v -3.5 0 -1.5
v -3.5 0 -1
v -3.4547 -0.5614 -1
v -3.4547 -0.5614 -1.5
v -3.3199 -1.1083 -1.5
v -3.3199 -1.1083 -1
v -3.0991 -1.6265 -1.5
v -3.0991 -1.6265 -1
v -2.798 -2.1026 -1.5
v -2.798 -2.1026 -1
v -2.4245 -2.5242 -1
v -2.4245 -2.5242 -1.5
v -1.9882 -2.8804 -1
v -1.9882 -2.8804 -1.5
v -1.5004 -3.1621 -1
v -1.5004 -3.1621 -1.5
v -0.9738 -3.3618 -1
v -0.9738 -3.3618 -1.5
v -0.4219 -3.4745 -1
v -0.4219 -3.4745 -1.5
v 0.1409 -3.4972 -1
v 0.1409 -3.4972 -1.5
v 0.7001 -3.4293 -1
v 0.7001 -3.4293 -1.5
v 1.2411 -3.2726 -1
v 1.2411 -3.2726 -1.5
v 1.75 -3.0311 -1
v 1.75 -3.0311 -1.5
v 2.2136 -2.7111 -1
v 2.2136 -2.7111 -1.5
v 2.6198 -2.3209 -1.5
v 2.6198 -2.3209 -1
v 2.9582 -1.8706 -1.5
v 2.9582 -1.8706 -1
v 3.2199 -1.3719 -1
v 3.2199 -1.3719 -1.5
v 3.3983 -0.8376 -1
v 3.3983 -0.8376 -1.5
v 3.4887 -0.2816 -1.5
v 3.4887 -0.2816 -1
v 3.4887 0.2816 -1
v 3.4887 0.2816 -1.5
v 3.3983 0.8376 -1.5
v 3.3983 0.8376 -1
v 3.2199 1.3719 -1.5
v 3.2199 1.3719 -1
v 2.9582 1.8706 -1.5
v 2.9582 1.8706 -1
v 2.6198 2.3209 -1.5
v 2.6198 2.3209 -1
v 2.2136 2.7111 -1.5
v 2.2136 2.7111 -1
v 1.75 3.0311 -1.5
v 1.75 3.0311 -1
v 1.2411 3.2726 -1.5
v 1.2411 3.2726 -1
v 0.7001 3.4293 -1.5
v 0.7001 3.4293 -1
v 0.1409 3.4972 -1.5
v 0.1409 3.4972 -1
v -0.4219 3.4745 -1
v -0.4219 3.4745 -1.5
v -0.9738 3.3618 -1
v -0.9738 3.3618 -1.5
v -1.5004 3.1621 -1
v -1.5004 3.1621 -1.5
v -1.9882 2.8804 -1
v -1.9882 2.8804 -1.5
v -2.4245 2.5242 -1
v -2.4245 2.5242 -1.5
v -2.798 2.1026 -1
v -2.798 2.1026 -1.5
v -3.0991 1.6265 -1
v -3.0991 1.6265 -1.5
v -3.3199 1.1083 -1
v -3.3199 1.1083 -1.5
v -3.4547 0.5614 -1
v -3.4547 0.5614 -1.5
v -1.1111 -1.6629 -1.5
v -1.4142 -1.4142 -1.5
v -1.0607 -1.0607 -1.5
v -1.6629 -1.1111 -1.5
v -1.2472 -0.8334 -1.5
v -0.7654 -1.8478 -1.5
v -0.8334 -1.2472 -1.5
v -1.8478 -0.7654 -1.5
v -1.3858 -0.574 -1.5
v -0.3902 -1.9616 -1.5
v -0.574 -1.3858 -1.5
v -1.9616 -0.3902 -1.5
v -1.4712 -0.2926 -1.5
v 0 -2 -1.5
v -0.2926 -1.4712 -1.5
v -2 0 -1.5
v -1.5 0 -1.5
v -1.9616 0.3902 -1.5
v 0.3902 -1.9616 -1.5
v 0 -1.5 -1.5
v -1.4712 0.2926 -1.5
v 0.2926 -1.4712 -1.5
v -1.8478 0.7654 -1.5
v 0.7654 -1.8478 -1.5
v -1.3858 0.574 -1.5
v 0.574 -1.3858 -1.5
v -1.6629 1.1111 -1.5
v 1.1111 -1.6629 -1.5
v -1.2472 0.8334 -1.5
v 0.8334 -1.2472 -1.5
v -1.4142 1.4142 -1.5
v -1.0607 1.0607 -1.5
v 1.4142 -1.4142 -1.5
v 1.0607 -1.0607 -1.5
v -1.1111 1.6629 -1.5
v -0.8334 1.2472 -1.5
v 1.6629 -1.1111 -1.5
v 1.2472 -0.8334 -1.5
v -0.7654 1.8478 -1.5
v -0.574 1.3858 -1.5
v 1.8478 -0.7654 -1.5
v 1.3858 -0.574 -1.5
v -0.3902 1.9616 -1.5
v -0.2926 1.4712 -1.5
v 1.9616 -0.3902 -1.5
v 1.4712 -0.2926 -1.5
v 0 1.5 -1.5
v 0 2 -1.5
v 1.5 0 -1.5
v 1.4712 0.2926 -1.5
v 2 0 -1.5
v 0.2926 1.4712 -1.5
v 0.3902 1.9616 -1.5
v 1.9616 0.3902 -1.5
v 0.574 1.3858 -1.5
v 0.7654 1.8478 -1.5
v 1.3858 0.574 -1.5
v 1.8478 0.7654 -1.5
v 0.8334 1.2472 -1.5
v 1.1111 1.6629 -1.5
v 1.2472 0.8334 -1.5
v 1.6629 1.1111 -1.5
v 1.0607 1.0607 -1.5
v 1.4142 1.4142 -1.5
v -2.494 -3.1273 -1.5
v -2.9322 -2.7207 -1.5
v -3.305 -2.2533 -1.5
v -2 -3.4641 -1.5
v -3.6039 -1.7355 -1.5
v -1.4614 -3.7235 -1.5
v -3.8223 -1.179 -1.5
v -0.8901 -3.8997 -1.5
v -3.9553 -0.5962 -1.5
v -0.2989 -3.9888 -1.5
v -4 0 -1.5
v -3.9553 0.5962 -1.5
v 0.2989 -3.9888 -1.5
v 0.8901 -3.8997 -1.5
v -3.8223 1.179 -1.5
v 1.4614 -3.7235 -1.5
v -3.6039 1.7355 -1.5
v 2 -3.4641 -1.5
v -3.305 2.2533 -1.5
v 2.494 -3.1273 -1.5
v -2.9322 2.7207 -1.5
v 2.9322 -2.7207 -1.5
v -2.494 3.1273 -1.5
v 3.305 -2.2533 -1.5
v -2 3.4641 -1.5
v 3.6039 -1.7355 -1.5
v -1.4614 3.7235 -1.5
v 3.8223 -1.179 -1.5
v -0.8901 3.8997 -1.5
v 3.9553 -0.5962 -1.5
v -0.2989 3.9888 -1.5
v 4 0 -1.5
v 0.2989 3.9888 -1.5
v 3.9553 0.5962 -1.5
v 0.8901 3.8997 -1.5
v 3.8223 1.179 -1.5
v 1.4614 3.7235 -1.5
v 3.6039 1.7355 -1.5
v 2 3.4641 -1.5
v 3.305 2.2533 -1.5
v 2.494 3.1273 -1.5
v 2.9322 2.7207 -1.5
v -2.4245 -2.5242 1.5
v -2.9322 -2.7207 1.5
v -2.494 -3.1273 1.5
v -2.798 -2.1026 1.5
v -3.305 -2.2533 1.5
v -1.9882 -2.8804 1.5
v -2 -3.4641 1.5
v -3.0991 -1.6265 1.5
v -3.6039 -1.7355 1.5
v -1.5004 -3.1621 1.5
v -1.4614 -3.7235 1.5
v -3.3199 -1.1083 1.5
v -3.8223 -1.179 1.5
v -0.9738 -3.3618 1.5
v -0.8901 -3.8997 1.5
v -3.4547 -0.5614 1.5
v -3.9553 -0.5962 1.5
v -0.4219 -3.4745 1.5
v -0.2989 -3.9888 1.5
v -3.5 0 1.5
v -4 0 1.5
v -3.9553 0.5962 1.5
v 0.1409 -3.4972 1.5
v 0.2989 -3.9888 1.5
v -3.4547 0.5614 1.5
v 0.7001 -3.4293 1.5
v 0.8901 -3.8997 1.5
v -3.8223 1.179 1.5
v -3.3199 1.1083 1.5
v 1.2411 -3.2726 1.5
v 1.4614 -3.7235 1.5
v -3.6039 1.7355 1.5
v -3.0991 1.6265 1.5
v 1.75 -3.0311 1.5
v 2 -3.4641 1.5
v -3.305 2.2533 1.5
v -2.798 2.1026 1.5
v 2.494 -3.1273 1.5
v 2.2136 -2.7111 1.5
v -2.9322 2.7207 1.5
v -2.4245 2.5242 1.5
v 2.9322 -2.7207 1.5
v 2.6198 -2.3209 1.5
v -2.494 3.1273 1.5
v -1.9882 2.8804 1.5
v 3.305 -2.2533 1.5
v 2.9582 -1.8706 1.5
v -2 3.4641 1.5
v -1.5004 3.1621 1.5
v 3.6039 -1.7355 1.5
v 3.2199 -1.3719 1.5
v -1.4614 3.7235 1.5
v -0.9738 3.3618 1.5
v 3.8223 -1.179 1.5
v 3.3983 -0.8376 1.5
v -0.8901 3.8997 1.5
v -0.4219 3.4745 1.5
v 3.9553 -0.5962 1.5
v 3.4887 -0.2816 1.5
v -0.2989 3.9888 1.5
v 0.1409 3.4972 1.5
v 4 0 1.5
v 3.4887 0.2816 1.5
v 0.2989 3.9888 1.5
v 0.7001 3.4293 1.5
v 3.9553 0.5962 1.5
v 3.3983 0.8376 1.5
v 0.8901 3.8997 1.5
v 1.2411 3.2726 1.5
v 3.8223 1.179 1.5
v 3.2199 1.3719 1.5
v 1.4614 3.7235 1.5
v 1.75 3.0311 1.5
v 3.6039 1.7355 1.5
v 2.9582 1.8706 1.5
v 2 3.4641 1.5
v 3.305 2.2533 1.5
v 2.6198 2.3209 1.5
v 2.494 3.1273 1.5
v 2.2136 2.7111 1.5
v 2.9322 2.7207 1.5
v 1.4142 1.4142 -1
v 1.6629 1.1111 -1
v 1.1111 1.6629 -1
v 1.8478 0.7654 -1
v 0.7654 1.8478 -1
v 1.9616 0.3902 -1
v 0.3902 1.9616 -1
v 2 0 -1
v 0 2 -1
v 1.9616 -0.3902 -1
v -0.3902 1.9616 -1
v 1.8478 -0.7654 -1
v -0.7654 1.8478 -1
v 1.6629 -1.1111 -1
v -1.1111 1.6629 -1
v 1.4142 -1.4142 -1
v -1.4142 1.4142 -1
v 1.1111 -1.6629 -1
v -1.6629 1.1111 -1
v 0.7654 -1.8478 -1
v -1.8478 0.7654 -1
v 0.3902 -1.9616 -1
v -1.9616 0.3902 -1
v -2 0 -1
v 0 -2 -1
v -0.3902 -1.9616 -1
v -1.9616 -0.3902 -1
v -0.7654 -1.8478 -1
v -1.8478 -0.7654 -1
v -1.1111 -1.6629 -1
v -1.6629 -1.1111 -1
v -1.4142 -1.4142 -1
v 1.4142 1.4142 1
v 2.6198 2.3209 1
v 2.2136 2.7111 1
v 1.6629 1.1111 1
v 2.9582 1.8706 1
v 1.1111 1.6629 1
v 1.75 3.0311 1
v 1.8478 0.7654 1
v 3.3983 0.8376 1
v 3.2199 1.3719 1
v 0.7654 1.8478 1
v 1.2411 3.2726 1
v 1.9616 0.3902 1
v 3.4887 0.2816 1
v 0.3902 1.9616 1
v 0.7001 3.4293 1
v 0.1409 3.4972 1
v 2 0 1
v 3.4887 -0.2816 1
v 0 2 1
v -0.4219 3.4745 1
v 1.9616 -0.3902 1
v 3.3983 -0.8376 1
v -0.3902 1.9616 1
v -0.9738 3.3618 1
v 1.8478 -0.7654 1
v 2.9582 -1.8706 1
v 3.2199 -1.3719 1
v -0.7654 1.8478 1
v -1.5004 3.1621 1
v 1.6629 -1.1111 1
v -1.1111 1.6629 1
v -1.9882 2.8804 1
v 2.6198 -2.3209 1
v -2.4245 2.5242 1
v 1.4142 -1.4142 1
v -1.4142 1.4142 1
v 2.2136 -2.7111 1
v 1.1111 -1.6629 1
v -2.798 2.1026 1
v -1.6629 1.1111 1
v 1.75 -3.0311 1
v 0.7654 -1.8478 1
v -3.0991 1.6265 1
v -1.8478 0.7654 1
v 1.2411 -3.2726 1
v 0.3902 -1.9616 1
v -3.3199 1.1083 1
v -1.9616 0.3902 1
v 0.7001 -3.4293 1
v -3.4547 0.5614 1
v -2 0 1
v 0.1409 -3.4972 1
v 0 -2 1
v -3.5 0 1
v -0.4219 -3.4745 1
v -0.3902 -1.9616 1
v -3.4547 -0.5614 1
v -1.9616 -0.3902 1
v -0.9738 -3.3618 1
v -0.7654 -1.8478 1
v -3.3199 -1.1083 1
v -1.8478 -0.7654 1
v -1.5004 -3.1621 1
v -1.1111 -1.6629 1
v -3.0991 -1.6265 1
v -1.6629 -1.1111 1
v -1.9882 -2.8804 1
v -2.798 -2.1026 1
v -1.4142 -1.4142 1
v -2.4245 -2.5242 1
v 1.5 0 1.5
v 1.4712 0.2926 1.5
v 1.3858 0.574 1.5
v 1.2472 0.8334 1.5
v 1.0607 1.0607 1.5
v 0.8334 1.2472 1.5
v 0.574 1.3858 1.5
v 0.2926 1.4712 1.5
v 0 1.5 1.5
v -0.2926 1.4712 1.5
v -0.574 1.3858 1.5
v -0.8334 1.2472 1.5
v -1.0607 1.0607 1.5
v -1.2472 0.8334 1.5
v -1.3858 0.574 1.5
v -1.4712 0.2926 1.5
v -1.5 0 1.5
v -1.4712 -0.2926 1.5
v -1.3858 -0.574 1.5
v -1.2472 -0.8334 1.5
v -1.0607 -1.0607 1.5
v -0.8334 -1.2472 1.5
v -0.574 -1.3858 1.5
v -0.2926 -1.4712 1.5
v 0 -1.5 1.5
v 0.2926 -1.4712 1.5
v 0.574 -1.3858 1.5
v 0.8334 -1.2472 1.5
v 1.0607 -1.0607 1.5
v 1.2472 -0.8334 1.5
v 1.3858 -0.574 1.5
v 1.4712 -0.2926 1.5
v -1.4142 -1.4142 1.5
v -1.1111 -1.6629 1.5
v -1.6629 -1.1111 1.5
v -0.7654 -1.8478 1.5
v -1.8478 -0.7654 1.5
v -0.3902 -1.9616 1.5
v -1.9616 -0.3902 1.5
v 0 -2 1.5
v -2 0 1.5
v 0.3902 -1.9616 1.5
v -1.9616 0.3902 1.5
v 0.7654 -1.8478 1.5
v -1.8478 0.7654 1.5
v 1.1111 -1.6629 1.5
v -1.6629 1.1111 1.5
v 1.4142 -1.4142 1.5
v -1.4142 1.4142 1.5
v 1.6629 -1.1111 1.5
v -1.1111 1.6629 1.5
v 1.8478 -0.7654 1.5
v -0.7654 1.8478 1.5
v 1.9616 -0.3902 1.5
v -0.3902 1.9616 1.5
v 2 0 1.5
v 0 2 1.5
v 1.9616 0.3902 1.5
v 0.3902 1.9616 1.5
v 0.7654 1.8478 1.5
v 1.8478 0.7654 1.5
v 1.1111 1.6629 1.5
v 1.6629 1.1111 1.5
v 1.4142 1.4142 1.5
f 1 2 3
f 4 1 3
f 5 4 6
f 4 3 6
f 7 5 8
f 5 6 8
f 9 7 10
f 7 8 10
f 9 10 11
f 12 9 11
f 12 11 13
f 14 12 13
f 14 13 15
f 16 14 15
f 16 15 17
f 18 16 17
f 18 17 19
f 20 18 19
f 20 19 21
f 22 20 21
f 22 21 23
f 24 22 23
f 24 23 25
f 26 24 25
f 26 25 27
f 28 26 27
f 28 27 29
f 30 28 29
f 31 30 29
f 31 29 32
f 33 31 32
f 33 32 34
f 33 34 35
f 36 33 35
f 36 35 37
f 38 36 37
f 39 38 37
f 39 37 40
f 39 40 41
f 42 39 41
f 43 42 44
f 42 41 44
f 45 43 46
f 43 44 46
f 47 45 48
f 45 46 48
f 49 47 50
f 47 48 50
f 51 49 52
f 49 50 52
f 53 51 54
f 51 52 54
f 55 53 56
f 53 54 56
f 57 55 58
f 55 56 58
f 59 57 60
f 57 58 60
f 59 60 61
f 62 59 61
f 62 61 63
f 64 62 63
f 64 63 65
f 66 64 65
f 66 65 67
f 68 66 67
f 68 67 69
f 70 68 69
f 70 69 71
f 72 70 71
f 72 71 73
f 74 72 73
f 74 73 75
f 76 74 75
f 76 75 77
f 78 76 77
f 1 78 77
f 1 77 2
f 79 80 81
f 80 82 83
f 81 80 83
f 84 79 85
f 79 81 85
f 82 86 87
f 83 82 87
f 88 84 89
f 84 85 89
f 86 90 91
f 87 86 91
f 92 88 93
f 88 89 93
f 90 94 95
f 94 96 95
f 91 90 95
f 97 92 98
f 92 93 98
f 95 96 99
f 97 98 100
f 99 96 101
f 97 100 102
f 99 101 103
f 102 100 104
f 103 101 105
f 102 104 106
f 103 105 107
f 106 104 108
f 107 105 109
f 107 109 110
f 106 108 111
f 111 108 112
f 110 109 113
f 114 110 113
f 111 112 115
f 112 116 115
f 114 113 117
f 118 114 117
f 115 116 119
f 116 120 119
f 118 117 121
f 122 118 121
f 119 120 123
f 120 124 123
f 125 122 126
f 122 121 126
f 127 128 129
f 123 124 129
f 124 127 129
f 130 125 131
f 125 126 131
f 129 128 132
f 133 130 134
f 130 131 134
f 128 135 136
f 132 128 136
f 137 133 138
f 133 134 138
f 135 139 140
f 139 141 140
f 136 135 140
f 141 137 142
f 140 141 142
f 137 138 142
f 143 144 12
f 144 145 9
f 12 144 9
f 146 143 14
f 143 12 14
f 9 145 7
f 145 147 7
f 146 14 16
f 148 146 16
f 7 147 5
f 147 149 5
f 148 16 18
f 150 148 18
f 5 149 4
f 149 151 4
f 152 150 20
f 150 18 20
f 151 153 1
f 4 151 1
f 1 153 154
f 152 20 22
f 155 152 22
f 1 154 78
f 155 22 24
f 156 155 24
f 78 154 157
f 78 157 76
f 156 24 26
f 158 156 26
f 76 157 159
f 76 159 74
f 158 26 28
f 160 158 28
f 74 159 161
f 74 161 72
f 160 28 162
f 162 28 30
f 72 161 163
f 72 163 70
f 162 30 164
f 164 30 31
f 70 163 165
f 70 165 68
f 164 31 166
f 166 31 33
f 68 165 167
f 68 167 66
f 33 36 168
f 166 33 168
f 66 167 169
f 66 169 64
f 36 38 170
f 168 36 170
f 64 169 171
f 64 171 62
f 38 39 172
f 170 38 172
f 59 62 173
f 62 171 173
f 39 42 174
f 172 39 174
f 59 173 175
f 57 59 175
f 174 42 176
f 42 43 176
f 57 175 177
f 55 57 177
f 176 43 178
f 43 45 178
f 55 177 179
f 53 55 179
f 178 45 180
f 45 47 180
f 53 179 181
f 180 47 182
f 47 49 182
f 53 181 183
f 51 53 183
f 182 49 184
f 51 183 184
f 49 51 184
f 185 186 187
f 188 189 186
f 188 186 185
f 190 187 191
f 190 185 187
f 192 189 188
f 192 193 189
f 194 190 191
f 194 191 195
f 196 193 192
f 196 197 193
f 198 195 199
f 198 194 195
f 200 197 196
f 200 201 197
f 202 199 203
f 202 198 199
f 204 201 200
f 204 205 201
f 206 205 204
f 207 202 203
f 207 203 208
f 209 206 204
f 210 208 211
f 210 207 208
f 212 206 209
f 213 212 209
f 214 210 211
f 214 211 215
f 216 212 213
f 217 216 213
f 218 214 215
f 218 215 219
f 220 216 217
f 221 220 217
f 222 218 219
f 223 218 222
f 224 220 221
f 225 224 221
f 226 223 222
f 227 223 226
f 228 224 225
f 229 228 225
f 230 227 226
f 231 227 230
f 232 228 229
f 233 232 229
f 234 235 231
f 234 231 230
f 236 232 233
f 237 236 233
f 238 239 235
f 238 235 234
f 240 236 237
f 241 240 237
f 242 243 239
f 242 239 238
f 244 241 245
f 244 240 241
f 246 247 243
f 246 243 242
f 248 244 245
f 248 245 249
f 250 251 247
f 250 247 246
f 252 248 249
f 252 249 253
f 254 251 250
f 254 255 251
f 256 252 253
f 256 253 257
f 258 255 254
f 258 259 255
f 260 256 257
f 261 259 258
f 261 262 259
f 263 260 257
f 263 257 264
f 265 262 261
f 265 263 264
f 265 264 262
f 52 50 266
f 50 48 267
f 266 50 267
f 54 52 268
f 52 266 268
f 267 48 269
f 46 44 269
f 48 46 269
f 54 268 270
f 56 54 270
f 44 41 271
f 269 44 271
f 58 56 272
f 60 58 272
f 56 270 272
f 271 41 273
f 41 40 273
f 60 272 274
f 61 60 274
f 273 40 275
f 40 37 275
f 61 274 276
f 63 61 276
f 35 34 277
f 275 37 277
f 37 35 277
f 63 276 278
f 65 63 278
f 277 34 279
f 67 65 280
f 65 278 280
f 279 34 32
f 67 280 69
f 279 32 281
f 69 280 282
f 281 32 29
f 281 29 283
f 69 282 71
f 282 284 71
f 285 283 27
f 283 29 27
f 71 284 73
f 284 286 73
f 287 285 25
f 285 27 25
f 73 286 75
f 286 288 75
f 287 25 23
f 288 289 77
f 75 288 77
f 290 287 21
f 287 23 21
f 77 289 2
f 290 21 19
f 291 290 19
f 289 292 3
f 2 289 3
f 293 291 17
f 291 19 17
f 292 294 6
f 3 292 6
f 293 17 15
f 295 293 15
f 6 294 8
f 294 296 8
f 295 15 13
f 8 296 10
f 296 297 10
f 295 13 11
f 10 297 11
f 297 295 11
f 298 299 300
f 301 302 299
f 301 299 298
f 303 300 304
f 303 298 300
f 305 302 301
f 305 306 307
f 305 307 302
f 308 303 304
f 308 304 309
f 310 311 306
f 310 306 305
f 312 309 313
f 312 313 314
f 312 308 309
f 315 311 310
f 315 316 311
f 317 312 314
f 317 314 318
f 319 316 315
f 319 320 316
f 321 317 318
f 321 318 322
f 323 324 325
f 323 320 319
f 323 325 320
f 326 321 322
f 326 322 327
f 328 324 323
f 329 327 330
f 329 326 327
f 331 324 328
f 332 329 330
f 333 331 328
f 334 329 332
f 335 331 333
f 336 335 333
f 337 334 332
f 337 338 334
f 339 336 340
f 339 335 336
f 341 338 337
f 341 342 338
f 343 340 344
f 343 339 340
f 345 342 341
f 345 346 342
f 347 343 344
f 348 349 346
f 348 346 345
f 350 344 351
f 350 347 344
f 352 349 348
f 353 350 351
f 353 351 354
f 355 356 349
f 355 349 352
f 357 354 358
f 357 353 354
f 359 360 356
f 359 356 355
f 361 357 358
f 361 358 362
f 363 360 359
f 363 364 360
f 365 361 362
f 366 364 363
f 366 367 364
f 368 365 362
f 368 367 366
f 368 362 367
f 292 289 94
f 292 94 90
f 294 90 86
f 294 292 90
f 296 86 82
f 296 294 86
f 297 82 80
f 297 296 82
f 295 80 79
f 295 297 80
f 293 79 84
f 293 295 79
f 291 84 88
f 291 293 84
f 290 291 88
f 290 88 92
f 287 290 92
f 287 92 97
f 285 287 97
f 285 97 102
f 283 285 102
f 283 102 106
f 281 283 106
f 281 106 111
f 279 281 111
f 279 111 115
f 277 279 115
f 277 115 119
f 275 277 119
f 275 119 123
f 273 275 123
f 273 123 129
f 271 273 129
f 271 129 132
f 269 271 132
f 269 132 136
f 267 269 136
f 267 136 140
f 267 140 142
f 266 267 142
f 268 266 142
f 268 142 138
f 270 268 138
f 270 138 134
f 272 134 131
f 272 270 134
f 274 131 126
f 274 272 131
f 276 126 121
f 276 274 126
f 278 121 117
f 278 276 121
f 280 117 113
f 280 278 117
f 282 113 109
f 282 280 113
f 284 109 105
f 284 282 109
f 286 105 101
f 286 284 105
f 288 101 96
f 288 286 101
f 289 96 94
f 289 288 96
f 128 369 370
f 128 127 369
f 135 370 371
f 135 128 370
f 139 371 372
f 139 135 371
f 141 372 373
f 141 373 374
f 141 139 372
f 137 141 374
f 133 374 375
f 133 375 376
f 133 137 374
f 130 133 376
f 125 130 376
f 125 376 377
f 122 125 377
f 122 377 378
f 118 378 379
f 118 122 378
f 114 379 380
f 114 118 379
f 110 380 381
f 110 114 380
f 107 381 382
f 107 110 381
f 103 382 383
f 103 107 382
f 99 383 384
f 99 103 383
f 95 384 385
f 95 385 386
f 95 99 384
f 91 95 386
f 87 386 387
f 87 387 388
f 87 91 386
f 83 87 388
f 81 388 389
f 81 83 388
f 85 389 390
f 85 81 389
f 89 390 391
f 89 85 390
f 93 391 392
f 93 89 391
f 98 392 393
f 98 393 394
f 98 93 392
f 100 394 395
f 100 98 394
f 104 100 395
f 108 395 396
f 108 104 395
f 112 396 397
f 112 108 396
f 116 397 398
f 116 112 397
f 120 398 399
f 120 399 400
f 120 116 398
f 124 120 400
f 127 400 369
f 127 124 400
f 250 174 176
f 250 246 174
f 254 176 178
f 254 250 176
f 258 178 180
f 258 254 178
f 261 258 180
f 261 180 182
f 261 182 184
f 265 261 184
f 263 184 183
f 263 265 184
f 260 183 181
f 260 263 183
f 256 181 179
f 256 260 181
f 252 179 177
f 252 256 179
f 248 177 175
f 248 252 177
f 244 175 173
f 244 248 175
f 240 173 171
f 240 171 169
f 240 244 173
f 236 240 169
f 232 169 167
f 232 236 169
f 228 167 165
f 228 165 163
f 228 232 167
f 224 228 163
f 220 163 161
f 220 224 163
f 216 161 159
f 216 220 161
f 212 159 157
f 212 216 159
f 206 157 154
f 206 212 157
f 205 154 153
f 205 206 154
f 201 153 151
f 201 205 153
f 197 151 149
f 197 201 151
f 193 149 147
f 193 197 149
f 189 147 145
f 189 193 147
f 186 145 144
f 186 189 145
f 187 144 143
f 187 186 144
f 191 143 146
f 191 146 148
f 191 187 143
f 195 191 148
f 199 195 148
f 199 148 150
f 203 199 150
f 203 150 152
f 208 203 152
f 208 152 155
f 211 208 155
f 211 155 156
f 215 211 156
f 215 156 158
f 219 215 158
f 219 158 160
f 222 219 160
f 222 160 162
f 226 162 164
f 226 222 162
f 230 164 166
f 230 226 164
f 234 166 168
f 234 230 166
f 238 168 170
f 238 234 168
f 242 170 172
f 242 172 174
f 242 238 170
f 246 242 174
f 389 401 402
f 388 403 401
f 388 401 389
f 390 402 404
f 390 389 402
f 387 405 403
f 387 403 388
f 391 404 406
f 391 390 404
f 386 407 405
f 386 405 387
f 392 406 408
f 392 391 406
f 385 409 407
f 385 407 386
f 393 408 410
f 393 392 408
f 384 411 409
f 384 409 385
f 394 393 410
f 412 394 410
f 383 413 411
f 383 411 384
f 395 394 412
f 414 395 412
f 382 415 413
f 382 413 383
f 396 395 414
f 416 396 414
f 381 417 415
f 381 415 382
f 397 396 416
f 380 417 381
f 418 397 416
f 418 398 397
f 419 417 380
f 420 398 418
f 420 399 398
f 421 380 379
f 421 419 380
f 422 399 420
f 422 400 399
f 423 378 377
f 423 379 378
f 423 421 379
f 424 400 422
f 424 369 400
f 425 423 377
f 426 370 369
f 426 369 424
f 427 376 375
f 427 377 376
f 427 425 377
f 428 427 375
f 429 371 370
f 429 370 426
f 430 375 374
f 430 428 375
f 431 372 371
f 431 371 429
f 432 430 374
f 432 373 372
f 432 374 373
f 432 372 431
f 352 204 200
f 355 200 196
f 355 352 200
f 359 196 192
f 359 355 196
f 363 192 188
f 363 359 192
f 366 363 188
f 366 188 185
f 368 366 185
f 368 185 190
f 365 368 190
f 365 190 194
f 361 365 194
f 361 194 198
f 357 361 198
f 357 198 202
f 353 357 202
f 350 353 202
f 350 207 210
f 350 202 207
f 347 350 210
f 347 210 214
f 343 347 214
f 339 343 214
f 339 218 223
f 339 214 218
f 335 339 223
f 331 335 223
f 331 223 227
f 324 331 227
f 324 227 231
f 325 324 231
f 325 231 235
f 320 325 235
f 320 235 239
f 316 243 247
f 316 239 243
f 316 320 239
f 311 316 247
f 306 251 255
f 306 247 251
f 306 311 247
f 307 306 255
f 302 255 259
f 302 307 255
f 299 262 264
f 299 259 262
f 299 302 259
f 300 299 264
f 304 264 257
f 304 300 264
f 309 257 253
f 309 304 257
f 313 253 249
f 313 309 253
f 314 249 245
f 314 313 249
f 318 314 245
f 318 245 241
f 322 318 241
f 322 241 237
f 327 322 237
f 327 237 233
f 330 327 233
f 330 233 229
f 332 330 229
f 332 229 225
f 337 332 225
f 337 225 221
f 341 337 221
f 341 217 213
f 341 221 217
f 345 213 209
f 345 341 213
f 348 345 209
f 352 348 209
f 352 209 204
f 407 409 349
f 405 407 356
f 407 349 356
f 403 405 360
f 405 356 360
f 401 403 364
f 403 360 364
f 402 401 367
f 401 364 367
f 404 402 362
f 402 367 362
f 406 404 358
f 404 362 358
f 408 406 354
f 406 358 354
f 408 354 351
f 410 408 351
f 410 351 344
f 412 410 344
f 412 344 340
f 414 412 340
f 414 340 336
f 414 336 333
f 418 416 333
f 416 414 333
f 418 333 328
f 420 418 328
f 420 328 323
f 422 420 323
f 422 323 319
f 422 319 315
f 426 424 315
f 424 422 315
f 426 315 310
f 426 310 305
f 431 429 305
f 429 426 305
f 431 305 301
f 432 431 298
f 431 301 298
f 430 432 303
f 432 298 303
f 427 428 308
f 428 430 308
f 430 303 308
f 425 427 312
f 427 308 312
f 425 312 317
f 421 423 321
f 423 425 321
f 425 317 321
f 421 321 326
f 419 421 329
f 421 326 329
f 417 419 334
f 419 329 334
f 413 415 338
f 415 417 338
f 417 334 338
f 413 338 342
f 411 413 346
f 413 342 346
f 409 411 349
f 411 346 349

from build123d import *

# Parameters (mm, degrees)
SKETCH1_R           = 4
SKETCH1_R_2         = 1.5
BOSS_EXTRUDE1_DEPTH = 1.5
CUT_EXTRUDE1_START  = -0.5
SKETCH2_R           = 3.5
SKETCH2_R_2         = 2
CUT_EXTRUDE1_DEPTH  = 7.903124237


with BuildPart() as part:
    # Sketch1 → Boss-Extrude1 (new, symmetric)
    with BuildSketch(Plane.XY):
        Circle(SKETCH1_R)
        Circle(SKETCH1_R_2, mode=Mode.SUBTRACT)
    extrude(amount=BOSS_EXTRUDE1_DEPTH, both=True)

    # Sketch2 → Cut-Extrude1 (cut)
    with BuildSketch(Plane.XY.offset(1.5).offset(CUT_EXTRUDE1_START)):
        with Locations(Location((0, 0, 0), (0, 0, 180))):
            Circle(SKETCH2_R)
        with Locations(Location((0, 0, 0), (0, 0, 180))):
            Circle(SKETCH2_R_2, mode=Mode.SUBTRACT)
    cut_extrude1 = extrude(amount=CUT_EXTRUDE1_DEPTH, mode=Mode.SUBTRACT)

    # Mirror1: Cut-Extrude1 across plane
    add(cut_extrude1.mirror(Plane.XY), mode=Mode.SUBTRACT)


solid = part.part
